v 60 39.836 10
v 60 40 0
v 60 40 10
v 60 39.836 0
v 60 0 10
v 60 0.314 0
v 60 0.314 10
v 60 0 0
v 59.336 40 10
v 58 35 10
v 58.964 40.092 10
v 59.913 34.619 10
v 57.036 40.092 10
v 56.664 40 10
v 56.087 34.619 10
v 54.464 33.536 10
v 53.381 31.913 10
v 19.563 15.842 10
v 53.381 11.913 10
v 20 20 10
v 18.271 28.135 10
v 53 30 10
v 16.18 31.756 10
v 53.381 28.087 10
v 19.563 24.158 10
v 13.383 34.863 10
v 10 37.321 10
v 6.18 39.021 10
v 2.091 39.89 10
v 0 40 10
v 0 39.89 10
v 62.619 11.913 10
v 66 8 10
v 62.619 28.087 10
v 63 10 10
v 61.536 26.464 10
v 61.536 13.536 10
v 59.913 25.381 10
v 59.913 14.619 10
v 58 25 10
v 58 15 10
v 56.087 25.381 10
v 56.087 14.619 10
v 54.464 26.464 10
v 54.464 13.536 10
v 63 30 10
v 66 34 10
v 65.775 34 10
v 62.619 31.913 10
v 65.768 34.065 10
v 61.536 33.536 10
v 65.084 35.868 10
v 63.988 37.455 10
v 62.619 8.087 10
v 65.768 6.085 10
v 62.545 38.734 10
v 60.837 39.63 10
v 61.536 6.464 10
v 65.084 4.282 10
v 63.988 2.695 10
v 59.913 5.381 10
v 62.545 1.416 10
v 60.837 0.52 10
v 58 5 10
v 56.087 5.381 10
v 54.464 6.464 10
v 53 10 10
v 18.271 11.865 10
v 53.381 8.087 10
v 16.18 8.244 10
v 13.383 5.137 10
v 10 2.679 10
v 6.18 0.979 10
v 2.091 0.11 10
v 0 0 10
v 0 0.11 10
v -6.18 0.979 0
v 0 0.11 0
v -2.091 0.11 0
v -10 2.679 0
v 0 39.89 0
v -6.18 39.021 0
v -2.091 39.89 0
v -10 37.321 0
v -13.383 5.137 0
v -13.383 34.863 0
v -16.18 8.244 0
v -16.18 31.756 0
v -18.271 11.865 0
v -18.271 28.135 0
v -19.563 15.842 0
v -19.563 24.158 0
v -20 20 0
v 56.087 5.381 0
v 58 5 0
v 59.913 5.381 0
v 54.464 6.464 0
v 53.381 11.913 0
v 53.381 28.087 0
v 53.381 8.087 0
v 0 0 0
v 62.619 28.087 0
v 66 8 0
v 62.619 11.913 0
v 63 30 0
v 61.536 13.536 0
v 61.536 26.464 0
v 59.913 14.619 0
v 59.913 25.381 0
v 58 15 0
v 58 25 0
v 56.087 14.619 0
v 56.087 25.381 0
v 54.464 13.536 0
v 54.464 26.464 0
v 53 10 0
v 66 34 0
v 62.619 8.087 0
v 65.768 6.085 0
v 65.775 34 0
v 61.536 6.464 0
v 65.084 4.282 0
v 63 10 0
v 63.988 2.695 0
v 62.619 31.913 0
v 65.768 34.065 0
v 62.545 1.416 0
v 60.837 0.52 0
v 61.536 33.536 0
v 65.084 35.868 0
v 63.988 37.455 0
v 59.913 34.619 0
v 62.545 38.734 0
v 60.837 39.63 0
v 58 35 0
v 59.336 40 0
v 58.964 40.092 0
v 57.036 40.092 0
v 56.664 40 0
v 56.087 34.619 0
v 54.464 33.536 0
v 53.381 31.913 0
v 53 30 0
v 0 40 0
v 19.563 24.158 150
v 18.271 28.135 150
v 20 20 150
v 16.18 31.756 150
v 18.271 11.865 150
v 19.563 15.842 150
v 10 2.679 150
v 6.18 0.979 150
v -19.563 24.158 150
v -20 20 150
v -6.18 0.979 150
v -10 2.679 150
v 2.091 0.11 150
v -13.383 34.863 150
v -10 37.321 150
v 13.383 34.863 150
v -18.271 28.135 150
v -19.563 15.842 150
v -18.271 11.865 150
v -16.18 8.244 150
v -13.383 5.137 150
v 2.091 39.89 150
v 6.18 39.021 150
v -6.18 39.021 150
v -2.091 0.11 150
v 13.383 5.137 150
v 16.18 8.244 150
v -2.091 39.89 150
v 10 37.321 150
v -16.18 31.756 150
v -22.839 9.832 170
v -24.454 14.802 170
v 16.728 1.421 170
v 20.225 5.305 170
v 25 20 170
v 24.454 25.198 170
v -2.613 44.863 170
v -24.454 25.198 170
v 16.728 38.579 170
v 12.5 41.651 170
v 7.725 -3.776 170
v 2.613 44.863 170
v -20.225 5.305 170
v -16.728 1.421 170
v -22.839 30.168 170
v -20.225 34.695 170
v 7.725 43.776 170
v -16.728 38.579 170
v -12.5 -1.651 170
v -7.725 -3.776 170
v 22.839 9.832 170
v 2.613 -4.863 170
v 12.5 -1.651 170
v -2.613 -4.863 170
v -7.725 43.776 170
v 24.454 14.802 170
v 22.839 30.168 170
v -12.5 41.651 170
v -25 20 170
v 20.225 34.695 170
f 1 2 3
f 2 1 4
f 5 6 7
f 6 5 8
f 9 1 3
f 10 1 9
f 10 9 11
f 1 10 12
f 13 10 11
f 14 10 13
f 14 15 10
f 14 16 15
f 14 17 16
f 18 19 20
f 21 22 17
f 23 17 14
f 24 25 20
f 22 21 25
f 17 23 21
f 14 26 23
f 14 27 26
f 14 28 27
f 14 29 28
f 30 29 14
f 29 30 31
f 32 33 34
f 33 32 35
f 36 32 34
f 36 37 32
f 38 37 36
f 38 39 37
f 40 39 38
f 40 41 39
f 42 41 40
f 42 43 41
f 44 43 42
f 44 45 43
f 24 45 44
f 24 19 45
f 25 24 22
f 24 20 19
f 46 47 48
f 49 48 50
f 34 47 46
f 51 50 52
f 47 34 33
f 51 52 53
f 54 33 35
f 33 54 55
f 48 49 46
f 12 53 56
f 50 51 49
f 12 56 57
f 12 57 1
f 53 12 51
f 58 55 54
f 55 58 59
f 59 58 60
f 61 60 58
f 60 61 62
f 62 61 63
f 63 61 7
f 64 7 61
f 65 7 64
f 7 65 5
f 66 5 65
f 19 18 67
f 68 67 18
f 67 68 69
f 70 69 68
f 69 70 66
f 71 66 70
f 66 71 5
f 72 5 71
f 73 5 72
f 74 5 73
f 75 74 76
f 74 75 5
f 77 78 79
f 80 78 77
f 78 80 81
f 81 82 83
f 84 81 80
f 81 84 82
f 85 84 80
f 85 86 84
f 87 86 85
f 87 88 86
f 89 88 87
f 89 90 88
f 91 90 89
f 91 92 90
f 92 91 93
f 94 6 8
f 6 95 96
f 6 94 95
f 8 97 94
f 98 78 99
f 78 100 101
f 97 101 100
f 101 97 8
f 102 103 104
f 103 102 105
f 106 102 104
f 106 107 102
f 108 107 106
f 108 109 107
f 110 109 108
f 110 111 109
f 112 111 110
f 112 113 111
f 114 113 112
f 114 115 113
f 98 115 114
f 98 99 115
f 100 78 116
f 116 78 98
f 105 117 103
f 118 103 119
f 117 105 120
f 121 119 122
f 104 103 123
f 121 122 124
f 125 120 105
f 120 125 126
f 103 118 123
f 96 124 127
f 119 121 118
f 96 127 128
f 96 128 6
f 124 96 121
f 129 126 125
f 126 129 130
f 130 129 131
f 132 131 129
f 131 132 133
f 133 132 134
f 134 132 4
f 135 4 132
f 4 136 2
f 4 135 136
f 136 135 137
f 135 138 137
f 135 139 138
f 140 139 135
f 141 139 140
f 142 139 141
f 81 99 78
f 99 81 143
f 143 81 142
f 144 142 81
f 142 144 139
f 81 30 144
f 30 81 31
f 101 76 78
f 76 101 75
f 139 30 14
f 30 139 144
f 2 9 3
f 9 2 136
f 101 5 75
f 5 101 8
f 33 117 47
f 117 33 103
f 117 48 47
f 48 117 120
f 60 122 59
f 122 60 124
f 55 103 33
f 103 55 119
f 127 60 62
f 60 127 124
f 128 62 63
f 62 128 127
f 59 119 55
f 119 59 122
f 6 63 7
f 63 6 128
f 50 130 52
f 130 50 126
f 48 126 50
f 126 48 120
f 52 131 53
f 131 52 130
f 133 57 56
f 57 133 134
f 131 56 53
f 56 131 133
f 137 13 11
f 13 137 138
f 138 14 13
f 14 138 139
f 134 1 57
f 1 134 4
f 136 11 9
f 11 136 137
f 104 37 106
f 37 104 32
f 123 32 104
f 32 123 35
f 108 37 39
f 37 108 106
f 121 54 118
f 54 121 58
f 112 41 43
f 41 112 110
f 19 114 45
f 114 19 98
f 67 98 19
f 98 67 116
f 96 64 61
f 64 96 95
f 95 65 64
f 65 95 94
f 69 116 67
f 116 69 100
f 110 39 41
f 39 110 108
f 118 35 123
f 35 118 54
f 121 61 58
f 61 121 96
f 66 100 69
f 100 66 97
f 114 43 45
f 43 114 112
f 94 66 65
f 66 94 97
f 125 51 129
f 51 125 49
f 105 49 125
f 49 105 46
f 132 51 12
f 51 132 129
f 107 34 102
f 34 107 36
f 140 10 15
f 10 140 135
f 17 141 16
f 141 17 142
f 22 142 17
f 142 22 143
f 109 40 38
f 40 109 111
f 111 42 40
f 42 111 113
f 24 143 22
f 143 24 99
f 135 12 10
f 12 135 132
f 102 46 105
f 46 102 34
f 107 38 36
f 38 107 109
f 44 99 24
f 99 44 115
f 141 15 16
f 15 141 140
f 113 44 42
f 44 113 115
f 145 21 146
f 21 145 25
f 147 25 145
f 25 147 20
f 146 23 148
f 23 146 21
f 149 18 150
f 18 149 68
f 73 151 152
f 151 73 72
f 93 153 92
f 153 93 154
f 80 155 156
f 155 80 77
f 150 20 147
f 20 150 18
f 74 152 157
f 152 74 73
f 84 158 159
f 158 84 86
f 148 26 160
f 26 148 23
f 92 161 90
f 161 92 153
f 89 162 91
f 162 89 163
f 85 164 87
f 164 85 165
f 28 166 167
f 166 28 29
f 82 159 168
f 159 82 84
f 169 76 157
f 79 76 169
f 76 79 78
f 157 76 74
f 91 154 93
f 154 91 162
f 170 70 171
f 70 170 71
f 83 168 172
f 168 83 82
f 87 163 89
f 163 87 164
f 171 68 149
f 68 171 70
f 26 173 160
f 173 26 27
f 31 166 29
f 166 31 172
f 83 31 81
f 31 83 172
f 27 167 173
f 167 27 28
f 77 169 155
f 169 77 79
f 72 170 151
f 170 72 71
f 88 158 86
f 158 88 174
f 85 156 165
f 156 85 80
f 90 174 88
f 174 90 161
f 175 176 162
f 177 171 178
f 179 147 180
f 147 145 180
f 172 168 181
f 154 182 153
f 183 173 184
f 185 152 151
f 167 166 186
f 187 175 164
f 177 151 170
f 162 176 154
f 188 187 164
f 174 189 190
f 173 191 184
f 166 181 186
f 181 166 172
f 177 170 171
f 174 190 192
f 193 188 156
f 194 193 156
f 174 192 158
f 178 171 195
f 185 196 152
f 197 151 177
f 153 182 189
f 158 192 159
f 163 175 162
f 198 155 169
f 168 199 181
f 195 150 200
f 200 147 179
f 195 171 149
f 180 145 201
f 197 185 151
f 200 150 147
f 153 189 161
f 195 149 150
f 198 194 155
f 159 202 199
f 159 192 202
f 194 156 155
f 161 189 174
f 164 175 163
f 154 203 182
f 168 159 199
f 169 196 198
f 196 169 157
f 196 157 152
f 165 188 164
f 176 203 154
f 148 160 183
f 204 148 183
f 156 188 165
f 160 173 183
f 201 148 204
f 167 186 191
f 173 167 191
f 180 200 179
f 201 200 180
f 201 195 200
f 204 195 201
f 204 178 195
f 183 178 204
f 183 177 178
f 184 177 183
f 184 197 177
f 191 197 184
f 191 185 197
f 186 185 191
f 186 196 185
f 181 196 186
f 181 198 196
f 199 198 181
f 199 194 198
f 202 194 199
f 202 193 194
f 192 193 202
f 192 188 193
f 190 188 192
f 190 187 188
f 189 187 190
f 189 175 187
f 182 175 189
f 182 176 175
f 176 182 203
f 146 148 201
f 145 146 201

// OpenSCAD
union(){
	difference() {
		union() {
			cube([60,40,10]);
			translate([58, 8,0]) cube([8, 26,10]);
			translate([58,8,0]) cylinder(h=10, r=8);
			translate([58,32.15,0]) cylinder(h=10, r=8);
			}
		translate([58,10,-1]) cylinder(h = 12, r= 5);
		translate([58,30,-1]) cylinder(h = 12, r= 5);
	}
	translate([0,20,0]) cylinder(h = 150, r = 20);
	translate([0,20,150]) cylinder(h = 20, r1 = 20, r2 = 25);
}
